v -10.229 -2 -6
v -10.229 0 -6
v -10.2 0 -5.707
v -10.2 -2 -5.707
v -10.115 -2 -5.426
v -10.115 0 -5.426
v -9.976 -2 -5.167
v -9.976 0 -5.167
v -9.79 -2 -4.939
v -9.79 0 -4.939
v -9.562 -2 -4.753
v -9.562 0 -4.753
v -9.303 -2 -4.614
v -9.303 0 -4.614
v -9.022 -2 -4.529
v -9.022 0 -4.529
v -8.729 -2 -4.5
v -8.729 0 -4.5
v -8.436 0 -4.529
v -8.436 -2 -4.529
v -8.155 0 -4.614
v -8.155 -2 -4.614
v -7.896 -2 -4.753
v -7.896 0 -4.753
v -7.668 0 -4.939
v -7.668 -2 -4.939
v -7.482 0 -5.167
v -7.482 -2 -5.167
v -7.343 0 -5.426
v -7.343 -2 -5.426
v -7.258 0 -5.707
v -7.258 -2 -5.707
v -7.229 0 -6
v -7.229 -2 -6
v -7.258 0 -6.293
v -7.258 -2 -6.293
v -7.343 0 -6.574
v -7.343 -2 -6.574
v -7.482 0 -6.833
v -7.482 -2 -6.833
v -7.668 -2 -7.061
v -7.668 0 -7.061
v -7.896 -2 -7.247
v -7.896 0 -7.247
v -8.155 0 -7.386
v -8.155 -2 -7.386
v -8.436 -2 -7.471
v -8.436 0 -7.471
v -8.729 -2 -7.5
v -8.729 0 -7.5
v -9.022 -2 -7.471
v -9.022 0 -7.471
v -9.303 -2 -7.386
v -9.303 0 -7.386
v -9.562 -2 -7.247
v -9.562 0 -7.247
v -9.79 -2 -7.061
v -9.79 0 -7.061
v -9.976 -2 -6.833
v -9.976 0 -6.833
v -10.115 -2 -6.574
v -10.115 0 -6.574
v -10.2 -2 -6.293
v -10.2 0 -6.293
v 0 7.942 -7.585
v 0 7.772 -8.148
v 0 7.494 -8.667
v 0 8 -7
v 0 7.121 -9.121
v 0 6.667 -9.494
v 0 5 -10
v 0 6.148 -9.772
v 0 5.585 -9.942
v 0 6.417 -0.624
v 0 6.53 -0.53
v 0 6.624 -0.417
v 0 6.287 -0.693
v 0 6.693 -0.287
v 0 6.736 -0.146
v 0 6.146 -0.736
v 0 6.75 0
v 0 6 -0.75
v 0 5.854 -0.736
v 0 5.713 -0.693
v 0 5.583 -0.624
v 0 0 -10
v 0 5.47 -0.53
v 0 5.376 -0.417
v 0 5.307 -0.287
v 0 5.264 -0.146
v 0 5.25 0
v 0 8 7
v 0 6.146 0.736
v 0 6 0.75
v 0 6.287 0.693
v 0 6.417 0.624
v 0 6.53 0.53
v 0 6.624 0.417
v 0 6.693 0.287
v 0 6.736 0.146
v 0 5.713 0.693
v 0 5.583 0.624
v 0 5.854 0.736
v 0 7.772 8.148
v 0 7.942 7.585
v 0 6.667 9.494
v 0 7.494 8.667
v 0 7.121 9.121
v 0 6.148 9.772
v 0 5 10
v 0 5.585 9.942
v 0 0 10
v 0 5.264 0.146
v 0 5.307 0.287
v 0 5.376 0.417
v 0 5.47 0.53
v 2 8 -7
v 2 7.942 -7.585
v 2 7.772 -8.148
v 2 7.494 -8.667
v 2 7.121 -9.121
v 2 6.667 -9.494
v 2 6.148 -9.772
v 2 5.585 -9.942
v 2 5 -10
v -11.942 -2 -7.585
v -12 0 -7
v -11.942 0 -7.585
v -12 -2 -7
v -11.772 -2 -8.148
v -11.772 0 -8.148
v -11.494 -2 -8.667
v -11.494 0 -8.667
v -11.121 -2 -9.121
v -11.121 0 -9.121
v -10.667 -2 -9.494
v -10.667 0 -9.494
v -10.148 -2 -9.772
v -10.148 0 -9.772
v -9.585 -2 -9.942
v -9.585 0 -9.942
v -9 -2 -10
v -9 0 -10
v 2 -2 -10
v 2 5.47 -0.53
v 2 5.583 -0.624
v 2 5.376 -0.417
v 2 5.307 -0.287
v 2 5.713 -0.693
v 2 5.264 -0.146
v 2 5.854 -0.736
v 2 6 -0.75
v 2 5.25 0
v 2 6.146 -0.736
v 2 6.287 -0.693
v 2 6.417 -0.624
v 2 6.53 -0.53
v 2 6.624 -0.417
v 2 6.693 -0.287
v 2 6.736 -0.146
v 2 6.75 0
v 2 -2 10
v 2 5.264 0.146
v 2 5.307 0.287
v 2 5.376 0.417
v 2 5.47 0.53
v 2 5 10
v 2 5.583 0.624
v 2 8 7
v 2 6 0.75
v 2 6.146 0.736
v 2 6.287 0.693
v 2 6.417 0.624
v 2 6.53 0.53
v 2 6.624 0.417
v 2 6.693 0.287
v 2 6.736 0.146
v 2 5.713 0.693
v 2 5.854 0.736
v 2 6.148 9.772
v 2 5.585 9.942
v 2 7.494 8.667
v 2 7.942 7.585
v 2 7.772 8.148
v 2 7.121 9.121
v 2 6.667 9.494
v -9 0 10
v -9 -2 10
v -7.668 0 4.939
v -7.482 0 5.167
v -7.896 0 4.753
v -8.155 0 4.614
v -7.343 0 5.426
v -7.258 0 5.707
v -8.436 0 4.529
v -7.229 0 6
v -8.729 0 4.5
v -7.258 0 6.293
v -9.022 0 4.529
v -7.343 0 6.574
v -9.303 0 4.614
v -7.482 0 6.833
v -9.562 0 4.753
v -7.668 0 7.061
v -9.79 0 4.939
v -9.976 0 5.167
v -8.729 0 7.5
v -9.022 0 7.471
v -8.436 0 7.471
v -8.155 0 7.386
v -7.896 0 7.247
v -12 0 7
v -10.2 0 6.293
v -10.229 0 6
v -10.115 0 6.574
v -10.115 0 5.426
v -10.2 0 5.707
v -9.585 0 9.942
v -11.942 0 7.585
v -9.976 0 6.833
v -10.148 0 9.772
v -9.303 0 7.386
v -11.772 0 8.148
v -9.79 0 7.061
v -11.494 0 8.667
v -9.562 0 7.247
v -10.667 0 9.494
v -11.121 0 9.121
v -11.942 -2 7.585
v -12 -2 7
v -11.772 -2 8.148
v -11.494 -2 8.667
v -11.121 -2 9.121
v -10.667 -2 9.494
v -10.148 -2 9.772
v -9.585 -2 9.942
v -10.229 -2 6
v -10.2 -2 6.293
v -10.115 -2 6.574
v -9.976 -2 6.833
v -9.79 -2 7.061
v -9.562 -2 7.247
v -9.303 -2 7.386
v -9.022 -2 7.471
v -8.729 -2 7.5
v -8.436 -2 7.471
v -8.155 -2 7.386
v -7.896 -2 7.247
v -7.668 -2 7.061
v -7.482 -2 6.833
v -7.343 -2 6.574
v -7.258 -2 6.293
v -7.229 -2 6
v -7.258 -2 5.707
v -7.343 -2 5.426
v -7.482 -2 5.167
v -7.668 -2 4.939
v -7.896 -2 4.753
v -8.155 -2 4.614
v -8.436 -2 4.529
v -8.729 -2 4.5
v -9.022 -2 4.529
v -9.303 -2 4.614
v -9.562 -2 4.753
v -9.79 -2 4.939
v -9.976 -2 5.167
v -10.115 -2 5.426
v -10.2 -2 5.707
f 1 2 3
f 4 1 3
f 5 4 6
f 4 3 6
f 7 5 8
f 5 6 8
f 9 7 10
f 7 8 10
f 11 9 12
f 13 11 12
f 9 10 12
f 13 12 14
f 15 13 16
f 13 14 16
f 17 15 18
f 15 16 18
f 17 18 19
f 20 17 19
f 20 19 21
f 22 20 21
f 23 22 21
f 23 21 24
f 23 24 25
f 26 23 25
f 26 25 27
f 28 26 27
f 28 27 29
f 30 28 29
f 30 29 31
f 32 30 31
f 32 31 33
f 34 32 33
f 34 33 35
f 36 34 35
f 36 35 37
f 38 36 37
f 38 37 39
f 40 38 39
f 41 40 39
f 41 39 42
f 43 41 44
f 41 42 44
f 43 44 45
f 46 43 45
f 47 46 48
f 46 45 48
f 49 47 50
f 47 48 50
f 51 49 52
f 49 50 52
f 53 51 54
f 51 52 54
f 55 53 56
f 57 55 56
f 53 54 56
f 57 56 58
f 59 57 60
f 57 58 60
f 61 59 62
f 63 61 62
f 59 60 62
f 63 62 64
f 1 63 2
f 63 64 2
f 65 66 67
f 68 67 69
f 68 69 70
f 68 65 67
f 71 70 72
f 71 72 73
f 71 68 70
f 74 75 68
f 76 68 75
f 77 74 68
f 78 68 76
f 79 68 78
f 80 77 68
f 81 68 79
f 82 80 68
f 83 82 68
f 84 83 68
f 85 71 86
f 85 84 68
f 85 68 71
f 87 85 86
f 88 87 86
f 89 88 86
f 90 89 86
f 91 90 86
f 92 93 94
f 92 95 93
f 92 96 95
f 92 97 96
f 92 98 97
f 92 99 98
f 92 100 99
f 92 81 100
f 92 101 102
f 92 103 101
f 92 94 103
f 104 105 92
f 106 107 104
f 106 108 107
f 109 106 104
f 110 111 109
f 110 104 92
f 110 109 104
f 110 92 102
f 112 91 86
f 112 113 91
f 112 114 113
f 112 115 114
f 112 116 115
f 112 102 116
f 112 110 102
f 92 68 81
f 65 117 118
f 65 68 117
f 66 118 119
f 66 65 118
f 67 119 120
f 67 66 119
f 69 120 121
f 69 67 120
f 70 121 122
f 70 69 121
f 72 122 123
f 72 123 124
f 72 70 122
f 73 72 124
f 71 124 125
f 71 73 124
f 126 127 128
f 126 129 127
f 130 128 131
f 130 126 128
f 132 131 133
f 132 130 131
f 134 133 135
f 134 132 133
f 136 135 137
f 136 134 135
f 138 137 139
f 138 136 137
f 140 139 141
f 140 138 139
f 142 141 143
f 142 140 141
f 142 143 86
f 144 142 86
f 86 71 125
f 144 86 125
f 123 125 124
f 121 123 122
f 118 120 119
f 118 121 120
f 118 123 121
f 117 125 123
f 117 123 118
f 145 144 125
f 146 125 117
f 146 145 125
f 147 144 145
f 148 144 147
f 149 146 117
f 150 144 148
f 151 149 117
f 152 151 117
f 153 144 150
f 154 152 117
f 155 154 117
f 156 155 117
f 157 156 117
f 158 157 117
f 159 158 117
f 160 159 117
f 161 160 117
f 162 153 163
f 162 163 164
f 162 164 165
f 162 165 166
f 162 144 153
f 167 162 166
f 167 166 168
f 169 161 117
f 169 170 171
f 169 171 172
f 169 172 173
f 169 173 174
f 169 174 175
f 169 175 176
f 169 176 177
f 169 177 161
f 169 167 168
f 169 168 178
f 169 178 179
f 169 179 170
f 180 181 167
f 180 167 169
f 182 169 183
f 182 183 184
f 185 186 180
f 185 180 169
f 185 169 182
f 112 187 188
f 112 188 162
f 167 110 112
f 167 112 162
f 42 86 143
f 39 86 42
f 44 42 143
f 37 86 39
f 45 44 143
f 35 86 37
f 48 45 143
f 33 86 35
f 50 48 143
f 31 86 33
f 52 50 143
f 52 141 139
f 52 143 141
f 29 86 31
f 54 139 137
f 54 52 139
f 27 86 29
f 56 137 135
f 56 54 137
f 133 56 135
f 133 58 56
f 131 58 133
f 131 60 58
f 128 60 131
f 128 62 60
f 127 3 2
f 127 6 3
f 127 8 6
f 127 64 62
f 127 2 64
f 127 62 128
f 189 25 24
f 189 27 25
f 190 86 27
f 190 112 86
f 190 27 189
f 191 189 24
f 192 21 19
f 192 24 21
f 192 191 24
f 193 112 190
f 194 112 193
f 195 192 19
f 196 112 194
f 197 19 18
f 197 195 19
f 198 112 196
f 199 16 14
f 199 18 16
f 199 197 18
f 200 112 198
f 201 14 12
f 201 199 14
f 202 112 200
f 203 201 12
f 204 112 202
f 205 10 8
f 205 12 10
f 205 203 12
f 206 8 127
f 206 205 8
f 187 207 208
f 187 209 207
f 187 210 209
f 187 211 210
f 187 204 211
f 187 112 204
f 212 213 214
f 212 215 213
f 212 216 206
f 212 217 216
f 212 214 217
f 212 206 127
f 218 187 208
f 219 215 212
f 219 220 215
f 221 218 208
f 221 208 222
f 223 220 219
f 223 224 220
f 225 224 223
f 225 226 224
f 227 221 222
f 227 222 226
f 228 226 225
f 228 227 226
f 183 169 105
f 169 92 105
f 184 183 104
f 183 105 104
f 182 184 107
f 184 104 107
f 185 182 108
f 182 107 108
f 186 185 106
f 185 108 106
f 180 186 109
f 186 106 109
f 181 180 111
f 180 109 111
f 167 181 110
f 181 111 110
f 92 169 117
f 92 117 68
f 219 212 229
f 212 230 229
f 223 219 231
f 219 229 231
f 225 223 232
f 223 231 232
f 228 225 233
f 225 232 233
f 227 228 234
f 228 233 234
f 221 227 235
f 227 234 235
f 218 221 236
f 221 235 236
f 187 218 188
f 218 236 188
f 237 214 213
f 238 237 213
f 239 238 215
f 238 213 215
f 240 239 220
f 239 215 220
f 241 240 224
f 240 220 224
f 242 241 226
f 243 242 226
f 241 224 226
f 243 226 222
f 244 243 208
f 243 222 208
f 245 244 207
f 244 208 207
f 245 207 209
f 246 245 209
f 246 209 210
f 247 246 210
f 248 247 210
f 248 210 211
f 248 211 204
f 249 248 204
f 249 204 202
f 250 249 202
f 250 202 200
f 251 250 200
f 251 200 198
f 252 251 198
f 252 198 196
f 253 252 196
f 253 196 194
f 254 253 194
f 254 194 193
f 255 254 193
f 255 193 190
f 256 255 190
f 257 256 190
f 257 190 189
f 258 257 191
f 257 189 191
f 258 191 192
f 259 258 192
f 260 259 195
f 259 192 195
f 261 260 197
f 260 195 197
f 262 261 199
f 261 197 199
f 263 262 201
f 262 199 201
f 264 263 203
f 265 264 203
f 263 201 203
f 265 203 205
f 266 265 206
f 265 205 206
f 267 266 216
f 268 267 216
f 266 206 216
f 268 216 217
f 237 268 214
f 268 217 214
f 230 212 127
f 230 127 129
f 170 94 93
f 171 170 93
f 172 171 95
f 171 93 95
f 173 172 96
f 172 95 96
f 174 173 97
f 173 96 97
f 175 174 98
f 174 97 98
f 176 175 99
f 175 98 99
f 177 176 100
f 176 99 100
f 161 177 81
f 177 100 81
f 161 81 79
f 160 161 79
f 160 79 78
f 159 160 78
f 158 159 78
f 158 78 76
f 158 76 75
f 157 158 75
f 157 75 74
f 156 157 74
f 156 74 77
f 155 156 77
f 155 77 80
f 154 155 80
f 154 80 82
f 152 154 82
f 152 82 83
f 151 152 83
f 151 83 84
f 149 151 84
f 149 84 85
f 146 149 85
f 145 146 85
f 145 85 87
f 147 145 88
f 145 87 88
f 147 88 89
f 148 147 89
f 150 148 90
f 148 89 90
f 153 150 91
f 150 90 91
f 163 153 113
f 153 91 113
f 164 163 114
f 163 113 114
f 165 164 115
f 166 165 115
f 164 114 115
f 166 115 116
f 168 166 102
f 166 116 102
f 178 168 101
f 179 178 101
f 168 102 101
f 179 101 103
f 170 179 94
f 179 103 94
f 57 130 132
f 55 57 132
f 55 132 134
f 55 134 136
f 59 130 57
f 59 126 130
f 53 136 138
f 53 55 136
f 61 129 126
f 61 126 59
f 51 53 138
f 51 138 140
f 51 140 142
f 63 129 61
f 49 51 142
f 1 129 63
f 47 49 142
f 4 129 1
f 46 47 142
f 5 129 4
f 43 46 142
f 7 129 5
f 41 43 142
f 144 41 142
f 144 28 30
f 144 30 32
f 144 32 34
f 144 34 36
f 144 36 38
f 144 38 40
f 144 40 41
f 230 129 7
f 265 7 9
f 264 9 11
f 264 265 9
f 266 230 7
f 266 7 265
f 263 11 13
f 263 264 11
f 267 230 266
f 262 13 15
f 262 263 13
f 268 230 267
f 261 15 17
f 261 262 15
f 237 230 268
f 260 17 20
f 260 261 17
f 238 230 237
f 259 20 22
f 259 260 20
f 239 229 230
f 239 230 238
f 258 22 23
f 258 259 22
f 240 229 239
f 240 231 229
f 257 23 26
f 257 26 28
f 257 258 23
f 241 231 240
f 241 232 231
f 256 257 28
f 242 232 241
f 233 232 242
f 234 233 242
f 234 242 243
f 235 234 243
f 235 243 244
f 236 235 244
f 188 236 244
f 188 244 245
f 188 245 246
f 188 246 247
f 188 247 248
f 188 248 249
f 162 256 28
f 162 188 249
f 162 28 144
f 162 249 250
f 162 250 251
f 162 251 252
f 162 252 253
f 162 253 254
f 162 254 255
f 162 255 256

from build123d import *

# Parameters (mm, degrees)
EXTRUDE_THIN1_DEPTH = 10
FILLET2_R           = 3
SKETCH2_R           = 1.5
CUT_EXTRUDE1_DEPTH  = 10
SKETCH3_R           = 0.75
CUT_EXTRUDE2_DEPTH  = 10


with BuildPart() as part:
    # Sketch1 → Extrude-Thin1 (new, symmetric)
    with BuildSketch(Plane.XY):
        Polygon((0, 8), (0, 0), (-12, 0), (-12, -2), (2, -2), (2, 8), align=None)
    extrude(amount=EXTRUDE_THIN1_DEPTH, both=True)

    # Fillet2
    fillet2_edges = [part.edges().sort_by_distance(p)[0] for p in [
        (-12, -1, 10),
        (-12, -1, -10),
        (1, 8, -10),
        (1, 8, 10),
    ]]
    fillet(fillet2_edges, radius=FILLET2_R)

    # Sketch2 → Cut-Extrude1 (cut)
    with BuildSketch(Plane(origin=(0, 0, 0), x_dir=(1, 0, 0), z_dir=(0, 1, 0))):
        with Locations(Location((-8.729026119, 6, 0), (0, 0, 180))):
            Circle(SKETCH2_R)
        with Locations(Location((-8.729026119, -6, 0), (0, 0, 180))):
            Circle(SKETCH2_R)
    extrude(amount=-CUT_EXTRUDE1_DEPTH, mode=Mode.SUBTRACT)

    # Sketch3 → Cut-Extrude2 (cut)
    with BuildSketch(Plane.ZY):
        with Locations((0, 6)):
            Circle(SKETCH3_R)
    extrude(amount=-CUT_EXTRUDE2_DEPTH, mode=Mode.SUBTRACT)


solid = part.part
